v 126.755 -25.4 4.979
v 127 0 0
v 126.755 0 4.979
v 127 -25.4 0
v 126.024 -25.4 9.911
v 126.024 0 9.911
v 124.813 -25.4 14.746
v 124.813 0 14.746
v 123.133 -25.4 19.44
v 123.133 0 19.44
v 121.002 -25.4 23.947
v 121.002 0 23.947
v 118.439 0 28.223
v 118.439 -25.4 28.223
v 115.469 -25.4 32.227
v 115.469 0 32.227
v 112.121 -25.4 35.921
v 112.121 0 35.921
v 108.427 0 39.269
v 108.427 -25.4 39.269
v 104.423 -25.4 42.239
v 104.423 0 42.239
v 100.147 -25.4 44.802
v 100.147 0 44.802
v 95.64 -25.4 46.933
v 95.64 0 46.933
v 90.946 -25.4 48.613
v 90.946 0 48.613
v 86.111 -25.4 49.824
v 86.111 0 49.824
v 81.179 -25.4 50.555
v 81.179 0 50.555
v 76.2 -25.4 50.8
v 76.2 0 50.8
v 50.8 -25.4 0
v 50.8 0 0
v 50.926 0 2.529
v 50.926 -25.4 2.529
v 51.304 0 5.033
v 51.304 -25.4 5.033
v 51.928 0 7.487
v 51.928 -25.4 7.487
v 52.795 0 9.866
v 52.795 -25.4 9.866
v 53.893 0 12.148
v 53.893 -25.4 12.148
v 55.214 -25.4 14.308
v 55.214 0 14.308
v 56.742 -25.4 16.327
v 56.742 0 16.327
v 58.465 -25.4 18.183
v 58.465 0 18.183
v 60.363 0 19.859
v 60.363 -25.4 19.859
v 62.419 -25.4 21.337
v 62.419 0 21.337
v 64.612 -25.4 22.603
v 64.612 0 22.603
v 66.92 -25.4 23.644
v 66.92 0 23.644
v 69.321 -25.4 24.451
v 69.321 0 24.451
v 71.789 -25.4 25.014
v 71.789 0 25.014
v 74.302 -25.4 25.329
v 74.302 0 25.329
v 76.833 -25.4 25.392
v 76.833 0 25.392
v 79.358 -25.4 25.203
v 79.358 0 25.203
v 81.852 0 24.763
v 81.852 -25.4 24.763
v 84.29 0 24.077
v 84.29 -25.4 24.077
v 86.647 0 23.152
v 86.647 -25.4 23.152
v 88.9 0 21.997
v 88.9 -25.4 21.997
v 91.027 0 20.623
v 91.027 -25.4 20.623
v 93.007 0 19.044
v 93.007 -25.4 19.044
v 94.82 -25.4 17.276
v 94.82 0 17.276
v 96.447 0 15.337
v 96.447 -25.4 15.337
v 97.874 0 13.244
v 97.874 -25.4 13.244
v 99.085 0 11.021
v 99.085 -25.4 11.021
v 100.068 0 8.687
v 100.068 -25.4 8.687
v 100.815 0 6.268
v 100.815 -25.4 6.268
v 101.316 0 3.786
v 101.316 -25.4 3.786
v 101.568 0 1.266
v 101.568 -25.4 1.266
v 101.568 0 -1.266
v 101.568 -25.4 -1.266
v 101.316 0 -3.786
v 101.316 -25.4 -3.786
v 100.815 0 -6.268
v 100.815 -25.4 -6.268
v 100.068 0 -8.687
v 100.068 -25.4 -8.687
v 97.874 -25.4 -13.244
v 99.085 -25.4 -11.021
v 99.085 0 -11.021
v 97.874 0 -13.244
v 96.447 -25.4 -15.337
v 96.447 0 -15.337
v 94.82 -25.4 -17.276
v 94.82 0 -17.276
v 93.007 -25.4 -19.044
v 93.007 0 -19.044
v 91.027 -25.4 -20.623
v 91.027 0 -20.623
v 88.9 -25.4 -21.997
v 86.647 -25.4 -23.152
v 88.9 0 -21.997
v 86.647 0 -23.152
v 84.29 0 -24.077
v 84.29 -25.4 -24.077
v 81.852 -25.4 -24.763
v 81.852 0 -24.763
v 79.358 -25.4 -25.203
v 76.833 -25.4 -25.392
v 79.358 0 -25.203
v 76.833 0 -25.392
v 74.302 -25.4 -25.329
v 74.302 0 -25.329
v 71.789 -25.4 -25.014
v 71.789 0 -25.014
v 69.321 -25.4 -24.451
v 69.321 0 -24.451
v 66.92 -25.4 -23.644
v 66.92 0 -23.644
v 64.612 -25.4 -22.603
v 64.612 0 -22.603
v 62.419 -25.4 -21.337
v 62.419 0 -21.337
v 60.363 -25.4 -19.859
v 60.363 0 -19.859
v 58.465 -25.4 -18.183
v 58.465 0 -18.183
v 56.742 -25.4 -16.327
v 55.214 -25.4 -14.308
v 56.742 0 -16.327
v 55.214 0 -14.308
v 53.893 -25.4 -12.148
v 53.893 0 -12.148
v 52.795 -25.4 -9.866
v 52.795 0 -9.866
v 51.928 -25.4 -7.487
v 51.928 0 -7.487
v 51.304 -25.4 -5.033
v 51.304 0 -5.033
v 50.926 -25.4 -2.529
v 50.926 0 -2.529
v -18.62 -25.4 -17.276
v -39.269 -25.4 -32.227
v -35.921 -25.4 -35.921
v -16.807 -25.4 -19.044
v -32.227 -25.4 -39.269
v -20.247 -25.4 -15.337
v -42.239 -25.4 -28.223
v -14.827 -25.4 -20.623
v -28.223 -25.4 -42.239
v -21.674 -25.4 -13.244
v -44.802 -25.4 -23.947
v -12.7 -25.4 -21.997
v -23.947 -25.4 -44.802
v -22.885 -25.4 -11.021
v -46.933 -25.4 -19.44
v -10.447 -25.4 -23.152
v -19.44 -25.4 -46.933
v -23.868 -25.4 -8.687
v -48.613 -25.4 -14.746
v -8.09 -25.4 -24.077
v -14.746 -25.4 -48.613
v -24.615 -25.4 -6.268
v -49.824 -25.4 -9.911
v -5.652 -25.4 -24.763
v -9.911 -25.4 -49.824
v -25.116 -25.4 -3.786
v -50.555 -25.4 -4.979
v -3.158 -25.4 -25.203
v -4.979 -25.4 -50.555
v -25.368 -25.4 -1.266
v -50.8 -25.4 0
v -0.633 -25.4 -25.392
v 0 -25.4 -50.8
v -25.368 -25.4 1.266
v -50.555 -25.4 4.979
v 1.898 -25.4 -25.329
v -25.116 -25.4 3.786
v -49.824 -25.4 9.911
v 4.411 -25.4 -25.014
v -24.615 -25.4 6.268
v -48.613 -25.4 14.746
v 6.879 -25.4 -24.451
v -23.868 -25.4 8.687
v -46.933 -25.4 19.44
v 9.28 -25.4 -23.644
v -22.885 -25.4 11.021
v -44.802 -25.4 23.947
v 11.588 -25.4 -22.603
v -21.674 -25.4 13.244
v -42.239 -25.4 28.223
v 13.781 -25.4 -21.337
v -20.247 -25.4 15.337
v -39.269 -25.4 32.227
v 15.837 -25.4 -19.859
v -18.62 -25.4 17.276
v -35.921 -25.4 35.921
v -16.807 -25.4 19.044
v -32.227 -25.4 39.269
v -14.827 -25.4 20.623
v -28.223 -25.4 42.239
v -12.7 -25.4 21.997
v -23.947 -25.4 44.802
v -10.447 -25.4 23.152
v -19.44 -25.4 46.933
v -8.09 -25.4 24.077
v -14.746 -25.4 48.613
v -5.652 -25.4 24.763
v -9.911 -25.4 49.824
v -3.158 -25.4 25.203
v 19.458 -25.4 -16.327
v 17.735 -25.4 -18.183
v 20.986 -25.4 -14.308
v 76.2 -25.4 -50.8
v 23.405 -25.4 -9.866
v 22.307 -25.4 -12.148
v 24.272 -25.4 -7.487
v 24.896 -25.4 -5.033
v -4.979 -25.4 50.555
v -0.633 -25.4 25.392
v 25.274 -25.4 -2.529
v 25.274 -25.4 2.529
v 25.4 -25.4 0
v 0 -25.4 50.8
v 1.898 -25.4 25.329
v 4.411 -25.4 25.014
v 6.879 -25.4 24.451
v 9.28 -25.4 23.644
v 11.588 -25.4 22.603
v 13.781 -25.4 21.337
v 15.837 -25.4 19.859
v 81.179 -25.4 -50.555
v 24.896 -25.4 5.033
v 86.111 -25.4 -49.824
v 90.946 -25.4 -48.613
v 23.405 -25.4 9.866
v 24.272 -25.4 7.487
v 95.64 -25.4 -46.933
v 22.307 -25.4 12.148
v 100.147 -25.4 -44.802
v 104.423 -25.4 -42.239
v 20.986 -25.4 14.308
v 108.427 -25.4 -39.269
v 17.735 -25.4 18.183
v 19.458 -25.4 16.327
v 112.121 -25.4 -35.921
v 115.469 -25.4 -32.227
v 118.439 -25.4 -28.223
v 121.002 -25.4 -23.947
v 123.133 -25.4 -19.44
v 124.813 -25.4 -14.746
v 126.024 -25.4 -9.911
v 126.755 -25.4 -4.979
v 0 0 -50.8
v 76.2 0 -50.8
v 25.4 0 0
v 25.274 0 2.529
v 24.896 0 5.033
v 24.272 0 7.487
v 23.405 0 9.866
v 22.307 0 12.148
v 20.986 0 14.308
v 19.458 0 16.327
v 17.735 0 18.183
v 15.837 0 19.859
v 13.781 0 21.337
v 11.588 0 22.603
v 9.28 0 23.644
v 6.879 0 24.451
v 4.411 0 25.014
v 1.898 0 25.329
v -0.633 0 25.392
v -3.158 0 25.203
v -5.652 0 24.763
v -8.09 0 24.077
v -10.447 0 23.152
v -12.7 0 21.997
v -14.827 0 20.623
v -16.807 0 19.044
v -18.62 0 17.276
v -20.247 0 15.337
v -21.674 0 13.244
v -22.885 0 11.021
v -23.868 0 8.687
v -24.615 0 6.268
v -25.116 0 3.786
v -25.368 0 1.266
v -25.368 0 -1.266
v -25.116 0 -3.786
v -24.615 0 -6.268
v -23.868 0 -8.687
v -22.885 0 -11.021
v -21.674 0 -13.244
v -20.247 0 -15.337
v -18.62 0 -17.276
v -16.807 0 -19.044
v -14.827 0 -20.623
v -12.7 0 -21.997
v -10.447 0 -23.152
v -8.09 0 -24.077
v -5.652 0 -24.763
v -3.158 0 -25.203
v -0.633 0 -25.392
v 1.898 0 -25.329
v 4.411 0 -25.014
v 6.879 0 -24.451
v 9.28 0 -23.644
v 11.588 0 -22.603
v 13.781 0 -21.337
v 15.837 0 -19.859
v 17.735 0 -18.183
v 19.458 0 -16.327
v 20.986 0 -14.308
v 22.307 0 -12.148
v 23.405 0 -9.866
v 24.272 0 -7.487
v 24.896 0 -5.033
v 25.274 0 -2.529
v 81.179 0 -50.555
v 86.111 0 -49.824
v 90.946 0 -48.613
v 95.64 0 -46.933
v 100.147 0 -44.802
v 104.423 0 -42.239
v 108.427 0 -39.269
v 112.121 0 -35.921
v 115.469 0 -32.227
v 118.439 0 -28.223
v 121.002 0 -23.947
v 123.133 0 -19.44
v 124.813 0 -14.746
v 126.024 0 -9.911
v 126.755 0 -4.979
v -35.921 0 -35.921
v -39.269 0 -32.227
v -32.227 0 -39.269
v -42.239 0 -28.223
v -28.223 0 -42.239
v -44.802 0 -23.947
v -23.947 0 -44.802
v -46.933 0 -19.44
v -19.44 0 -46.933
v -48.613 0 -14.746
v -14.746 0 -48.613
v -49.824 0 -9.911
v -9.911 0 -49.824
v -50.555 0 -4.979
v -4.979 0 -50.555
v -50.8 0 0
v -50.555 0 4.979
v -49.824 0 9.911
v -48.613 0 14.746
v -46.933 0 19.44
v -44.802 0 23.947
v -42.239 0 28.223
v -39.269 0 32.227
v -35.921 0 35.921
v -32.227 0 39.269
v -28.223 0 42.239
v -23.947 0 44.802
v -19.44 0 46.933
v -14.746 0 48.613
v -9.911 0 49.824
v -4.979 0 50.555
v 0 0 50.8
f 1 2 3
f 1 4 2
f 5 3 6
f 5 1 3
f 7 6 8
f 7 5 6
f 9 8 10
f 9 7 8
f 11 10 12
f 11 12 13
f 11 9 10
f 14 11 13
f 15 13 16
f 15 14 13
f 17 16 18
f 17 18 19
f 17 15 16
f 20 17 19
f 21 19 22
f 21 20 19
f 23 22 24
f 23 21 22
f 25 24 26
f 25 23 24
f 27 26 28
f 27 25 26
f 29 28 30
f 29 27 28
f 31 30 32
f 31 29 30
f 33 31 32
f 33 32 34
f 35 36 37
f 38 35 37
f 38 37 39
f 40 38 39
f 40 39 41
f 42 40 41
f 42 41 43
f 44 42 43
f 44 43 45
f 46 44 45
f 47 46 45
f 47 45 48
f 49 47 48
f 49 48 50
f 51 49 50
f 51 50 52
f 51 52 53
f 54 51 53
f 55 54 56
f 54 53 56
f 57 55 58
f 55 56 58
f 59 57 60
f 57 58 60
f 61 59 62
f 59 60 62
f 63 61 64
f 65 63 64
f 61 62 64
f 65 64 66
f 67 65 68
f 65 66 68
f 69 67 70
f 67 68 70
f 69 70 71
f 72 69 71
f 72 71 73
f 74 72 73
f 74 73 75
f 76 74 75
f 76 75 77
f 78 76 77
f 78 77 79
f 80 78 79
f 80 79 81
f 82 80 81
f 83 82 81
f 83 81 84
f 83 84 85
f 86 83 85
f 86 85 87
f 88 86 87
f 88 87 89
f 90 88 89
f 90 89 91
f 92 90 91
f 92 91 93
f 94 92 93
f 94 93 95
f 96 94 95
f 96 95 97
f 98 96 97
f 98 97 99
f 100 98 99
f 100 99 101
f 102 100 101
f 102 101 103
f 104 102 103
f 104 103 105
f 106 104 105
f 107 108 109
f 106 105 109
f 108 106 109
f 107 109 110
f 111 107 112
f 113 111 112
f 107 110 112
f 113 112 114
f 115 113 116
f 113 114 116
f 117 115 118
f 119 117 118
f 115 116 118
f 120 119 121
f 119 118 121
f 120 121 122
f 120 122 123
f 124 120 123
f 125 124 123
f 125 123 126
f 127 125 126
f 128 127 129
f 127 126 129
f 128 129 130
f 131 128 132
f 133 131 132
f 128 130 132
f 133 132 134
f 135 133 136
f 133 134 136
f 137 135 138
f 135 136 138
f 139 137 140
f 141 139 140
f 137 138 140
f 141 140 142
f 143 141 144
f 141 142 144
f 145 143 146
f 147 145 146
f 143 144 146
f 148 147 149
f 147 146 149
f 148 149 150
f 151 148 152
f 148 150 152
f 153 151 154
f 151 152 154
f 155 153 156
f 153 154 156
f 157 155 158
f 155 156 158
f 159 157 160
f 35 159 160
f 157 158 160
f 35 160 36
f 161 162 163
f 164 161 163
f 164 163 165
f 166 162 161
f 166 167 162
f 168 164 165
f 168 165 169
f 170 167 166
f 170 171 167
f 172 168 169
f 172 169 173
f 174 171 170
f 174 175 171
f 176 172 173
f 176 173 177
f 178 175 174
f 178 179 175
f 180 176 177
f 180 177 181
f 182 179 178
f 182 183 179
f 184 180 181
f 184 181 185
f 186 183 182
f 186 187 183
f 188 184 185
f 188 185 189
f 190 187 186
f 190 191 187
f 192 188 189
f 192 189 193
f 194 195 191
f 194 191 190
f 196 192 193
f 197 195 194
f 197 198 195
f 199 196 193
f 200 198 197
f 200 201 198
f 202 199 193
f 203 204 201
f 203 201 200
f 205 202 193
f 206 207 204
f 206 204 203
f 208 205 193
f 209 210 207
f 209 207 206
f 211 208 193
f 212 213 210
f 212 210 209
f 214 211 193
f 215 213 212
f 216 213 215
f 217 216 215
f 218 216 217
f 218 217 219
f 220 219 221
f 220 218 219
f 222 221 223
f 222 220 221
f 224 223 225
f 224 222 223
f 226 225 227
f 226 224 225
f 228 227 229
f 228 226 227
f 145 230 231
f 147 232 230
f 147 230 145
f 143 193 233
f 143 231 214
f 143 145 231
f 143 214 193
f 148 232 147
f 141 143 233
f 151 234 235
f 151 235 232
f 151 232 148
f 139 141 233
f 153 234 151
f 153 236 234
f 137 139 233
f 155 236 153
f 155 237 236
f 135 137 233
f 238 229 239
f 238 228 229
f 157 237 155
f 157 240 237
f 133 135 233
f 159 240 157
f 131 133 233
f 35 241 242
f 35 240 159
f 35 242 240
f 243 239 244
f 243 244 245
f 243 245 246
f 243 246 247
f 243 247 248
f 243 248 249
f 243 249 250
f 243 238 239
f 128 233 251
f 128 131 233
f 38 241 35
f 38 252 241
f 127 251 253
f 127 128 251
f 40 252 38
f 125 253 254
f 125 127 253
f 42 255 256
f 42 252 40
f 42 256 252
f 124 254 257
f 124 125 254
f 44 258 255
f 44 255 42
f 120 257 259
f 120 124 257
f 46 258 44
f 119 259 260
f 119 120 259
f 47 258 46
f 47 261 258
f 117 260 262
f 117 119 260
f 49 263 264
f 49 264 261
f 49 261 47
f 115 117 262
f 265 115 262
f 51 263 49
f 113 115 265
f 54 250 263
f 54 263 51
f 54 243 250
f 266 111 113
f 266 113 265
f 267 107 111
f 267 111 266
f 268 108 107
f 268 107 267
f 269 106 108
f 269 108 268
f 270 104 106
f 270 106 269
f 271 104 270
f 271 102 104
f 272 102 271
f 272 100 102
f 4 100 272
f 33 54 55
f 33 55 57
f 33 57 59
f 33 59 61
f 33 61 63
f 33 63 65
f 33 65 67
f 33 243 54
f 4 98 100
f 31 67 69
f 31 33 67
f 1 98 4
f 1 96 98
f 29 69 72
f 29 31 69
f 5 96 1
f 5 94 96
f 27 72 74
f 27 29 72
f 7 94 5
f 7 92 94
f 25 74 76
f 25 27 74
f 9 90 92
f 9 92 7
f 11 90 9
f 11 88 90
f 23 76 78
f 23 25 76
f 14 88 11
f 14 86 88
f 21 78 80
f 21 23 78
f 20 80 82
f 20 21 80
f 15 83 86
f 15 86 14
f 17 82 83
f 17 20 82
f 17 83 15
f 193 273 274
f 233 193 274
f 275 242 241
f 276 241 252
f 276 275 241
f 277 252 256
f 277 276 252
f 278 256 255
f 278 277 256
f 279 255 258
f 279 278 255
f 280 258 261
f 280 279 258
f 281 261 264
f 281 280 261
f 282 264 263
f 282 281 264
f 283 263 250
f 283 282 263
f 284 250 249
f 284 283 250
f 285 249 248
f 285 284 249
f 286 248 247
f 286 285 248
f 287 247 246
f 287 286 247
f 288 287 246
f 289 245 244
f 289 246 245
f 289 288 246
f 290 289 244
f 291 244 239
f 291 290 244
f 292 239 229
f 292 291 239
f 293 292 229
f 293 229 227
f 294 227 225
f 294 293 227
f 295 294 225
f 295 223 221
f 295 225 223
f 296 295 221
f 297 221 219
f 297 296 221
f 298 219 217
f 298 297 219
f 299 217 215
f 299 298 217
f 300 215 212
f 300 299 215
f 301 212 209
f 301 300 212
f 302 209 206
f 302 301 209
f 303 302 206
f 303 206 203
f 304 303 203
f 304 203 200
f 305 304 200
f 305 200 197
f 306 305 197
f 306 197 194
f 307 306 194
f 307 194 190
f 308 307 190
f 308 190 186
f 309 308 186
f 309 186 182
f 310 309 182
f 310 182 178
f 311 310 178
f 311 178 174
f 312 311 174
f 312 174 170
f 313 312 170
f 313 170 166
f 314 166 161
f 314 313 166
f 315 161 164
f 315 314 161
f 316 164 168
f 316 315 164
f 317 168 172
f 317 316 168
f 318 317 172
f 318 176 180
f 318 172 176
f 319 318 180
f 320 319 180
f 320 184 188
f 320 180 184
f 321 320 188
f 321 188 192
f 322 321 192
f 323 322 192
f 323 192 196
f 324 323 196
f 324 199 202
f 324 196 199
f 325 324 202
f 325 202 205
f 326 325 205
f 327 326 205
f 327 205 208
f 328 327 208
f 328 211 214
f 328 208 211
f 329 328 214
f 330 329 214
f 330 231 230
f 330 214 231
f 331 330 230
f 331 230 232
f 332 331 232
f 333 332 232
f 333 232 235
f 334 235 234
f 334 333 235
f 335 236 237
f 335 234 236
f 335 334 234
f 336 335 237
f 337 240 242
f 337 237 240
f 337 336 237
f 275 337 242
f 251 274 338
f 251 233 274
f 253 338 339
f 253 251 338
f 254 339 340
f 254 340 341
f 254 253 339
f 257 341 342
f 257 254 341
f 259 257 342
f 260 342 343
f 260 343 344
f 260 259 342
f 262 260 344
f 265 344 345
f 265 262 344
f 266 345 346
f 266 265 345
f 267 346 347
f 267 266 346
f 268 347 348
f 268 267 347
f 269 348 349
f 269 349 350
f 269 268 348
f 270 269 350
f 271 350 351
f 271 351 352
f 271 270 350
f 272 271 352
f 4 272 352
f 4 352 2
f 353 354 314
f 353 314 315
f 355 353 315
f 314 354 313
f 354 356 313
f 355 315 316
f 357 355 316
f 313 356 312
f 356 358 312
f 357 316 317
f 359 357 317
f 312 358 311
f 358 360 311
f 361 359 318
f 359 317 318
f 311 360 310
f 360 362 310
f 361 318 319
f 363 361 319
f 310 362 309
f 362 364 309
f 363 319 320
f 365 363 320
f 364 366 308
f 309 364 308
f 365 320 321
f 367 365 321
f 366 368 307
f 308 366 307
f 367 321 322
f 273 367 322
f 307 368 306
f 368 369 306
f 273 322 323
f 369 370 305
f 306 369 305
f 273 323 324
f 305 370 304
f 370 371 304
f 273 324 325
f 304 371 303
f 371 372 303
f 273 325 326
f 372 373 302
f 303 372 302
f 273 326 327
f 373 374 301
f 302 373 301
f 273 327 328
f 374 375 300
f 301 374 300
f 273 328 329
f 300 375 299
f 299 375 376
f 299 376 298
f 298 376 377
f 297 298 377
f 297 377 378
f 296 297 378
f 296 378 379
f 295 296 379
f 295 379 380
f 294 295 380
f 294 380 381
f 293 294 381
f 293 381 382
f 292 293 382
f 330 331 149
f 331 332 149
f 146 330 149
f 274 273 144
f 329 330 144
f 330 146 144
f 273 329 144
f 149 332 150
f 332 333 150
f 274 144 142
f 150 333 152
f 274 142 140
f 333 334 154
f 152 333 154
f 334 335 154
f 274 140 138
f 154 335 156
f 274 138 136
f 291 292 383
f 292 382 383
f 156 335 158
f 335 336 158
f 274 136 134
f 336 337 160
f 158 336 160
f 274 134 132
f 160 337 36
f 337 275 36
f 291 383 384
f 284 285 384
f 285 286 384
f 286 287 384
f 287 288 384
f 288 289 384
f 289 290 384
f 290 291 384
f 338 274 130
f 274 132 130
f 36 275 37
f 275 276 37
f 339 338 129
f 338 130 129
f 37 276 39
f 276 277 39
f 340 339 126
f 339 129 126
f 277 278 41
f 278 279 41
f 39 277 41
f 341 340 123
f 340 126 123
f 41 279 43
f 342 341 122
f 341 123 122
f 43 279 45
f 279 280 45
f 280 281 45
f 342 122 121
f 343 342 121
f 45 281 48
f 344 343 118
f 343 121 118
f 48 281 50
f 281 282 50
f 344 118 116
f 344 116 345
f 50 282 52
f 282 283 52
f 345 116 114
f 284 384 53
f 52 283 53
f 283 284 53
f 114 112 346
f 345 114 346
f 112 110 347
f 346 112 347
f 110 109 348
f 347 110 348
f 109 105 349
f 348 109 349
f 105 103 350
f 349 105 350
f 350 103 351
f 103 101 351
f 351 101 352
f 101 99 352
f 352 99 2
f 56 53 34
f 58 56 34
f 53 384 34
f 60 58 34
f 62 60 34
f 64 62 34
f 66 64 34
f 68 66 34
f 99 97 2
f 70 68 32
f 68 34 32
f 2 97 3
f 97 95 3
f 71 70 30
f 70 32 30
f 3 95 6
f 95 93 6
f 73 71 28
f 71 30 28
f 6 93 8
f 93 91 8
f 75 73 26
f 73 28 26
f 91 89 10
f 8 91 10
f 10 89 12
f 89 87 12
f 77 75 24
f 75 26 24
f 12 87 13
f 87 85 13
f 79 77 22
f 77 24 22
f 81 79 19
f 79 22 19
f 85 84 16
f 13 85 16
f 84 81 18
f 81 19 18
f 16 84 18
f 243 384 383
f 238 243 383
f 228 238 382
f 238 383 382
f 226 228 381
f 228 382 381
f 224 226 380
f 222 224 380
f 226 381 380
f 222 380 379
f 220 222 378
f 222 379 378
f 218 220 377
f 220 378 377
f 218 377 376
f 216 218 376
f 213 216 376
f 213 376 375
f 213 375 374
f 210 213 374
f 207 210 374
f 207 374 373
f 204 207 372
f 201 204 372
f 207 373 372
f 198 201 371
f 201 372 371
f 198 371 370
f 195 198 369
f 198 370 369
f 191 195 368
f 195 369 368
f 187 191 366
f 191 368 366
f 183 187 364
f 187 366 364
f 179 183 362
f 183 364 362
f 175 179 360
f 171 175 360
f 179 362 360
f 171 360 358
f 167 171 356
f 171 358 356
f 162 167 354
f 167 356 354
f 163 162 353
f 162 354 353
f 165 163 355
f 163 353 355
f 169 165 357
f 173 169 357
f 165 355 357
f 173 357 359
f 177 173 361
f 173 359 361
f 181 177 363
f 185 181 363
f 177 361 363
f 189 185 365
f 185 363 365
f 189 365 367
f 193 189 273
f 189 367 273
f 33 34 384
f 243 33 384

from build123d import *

# Parameters (mm, degrees)
F1_DEPTH = 25.4
F2_R     = 50.79999
F3_R     = 25.4
F4_DEPTH = 79.248


# Not quite as in the source:
# - a fillet or chamfer is up to 0.001 mm smaller than in the source, because OpenCascade refuses the exact size


with BuildPart() as f1:
    # F0 (on Front) → F1 (new body)
    with BuildSketch(Plane.XZ):
        with BuildLine():
            ThreePointArc((0, -50.8), (35.9210244843, -35.9210244843), (50.8, 0))
            ThreePointArc((50.8, 0), (35.9210244843, 35.9210244843), (0, 50.8))
            Line((0, 50.8), (0, -50.8))
        make_face()
        with BuildLine():
            ThreePointArc((0, 50.8), (35.9210244843, 35.9210244843), (50.8, 0))
            ThreePointArc((50.8, 0), (35.9210244843, -35.9210244843), (0, -50.8))
            Line((0, -50.8), (127, -50.8))
            Line((127, -50.8), (127, 50.8))
            Line((127, 50.8), (0, 50.8))
        make_face()
        with BuildLine():
            Line((0, -50.8), (0, 50.8))
            ThreePointArc((0, 50.8), (-50.8, 0), (0, -50.8))
        make_face()
    extrude(amount=F1_DEPTH)

    # F2 (radius 50.8 in the source; OpenCascade refuses exactly that, so slightly less here)
    f2_edges = [f1.edges().sort_by_distance(p)[0] for p in [
        (127, -12.7, 50.8),
        (127, -12.7, -50.8),
    ]]
    fillet(f2_edges, radius=F2_R)

    # F3 (on Front) → F4 (cut)
    with BuildSketch(Plane.XZ):
        Circle(F3_R)
    f4 = extrude(amount=F4_DEPTH, mode=Mode.SUBTRACT)

    # F7: F4 across plane
    add(f4.mirror(Plane.YZ.offset(38.1)), mode=Mode.SUBTRACT)


solid = f1.part
